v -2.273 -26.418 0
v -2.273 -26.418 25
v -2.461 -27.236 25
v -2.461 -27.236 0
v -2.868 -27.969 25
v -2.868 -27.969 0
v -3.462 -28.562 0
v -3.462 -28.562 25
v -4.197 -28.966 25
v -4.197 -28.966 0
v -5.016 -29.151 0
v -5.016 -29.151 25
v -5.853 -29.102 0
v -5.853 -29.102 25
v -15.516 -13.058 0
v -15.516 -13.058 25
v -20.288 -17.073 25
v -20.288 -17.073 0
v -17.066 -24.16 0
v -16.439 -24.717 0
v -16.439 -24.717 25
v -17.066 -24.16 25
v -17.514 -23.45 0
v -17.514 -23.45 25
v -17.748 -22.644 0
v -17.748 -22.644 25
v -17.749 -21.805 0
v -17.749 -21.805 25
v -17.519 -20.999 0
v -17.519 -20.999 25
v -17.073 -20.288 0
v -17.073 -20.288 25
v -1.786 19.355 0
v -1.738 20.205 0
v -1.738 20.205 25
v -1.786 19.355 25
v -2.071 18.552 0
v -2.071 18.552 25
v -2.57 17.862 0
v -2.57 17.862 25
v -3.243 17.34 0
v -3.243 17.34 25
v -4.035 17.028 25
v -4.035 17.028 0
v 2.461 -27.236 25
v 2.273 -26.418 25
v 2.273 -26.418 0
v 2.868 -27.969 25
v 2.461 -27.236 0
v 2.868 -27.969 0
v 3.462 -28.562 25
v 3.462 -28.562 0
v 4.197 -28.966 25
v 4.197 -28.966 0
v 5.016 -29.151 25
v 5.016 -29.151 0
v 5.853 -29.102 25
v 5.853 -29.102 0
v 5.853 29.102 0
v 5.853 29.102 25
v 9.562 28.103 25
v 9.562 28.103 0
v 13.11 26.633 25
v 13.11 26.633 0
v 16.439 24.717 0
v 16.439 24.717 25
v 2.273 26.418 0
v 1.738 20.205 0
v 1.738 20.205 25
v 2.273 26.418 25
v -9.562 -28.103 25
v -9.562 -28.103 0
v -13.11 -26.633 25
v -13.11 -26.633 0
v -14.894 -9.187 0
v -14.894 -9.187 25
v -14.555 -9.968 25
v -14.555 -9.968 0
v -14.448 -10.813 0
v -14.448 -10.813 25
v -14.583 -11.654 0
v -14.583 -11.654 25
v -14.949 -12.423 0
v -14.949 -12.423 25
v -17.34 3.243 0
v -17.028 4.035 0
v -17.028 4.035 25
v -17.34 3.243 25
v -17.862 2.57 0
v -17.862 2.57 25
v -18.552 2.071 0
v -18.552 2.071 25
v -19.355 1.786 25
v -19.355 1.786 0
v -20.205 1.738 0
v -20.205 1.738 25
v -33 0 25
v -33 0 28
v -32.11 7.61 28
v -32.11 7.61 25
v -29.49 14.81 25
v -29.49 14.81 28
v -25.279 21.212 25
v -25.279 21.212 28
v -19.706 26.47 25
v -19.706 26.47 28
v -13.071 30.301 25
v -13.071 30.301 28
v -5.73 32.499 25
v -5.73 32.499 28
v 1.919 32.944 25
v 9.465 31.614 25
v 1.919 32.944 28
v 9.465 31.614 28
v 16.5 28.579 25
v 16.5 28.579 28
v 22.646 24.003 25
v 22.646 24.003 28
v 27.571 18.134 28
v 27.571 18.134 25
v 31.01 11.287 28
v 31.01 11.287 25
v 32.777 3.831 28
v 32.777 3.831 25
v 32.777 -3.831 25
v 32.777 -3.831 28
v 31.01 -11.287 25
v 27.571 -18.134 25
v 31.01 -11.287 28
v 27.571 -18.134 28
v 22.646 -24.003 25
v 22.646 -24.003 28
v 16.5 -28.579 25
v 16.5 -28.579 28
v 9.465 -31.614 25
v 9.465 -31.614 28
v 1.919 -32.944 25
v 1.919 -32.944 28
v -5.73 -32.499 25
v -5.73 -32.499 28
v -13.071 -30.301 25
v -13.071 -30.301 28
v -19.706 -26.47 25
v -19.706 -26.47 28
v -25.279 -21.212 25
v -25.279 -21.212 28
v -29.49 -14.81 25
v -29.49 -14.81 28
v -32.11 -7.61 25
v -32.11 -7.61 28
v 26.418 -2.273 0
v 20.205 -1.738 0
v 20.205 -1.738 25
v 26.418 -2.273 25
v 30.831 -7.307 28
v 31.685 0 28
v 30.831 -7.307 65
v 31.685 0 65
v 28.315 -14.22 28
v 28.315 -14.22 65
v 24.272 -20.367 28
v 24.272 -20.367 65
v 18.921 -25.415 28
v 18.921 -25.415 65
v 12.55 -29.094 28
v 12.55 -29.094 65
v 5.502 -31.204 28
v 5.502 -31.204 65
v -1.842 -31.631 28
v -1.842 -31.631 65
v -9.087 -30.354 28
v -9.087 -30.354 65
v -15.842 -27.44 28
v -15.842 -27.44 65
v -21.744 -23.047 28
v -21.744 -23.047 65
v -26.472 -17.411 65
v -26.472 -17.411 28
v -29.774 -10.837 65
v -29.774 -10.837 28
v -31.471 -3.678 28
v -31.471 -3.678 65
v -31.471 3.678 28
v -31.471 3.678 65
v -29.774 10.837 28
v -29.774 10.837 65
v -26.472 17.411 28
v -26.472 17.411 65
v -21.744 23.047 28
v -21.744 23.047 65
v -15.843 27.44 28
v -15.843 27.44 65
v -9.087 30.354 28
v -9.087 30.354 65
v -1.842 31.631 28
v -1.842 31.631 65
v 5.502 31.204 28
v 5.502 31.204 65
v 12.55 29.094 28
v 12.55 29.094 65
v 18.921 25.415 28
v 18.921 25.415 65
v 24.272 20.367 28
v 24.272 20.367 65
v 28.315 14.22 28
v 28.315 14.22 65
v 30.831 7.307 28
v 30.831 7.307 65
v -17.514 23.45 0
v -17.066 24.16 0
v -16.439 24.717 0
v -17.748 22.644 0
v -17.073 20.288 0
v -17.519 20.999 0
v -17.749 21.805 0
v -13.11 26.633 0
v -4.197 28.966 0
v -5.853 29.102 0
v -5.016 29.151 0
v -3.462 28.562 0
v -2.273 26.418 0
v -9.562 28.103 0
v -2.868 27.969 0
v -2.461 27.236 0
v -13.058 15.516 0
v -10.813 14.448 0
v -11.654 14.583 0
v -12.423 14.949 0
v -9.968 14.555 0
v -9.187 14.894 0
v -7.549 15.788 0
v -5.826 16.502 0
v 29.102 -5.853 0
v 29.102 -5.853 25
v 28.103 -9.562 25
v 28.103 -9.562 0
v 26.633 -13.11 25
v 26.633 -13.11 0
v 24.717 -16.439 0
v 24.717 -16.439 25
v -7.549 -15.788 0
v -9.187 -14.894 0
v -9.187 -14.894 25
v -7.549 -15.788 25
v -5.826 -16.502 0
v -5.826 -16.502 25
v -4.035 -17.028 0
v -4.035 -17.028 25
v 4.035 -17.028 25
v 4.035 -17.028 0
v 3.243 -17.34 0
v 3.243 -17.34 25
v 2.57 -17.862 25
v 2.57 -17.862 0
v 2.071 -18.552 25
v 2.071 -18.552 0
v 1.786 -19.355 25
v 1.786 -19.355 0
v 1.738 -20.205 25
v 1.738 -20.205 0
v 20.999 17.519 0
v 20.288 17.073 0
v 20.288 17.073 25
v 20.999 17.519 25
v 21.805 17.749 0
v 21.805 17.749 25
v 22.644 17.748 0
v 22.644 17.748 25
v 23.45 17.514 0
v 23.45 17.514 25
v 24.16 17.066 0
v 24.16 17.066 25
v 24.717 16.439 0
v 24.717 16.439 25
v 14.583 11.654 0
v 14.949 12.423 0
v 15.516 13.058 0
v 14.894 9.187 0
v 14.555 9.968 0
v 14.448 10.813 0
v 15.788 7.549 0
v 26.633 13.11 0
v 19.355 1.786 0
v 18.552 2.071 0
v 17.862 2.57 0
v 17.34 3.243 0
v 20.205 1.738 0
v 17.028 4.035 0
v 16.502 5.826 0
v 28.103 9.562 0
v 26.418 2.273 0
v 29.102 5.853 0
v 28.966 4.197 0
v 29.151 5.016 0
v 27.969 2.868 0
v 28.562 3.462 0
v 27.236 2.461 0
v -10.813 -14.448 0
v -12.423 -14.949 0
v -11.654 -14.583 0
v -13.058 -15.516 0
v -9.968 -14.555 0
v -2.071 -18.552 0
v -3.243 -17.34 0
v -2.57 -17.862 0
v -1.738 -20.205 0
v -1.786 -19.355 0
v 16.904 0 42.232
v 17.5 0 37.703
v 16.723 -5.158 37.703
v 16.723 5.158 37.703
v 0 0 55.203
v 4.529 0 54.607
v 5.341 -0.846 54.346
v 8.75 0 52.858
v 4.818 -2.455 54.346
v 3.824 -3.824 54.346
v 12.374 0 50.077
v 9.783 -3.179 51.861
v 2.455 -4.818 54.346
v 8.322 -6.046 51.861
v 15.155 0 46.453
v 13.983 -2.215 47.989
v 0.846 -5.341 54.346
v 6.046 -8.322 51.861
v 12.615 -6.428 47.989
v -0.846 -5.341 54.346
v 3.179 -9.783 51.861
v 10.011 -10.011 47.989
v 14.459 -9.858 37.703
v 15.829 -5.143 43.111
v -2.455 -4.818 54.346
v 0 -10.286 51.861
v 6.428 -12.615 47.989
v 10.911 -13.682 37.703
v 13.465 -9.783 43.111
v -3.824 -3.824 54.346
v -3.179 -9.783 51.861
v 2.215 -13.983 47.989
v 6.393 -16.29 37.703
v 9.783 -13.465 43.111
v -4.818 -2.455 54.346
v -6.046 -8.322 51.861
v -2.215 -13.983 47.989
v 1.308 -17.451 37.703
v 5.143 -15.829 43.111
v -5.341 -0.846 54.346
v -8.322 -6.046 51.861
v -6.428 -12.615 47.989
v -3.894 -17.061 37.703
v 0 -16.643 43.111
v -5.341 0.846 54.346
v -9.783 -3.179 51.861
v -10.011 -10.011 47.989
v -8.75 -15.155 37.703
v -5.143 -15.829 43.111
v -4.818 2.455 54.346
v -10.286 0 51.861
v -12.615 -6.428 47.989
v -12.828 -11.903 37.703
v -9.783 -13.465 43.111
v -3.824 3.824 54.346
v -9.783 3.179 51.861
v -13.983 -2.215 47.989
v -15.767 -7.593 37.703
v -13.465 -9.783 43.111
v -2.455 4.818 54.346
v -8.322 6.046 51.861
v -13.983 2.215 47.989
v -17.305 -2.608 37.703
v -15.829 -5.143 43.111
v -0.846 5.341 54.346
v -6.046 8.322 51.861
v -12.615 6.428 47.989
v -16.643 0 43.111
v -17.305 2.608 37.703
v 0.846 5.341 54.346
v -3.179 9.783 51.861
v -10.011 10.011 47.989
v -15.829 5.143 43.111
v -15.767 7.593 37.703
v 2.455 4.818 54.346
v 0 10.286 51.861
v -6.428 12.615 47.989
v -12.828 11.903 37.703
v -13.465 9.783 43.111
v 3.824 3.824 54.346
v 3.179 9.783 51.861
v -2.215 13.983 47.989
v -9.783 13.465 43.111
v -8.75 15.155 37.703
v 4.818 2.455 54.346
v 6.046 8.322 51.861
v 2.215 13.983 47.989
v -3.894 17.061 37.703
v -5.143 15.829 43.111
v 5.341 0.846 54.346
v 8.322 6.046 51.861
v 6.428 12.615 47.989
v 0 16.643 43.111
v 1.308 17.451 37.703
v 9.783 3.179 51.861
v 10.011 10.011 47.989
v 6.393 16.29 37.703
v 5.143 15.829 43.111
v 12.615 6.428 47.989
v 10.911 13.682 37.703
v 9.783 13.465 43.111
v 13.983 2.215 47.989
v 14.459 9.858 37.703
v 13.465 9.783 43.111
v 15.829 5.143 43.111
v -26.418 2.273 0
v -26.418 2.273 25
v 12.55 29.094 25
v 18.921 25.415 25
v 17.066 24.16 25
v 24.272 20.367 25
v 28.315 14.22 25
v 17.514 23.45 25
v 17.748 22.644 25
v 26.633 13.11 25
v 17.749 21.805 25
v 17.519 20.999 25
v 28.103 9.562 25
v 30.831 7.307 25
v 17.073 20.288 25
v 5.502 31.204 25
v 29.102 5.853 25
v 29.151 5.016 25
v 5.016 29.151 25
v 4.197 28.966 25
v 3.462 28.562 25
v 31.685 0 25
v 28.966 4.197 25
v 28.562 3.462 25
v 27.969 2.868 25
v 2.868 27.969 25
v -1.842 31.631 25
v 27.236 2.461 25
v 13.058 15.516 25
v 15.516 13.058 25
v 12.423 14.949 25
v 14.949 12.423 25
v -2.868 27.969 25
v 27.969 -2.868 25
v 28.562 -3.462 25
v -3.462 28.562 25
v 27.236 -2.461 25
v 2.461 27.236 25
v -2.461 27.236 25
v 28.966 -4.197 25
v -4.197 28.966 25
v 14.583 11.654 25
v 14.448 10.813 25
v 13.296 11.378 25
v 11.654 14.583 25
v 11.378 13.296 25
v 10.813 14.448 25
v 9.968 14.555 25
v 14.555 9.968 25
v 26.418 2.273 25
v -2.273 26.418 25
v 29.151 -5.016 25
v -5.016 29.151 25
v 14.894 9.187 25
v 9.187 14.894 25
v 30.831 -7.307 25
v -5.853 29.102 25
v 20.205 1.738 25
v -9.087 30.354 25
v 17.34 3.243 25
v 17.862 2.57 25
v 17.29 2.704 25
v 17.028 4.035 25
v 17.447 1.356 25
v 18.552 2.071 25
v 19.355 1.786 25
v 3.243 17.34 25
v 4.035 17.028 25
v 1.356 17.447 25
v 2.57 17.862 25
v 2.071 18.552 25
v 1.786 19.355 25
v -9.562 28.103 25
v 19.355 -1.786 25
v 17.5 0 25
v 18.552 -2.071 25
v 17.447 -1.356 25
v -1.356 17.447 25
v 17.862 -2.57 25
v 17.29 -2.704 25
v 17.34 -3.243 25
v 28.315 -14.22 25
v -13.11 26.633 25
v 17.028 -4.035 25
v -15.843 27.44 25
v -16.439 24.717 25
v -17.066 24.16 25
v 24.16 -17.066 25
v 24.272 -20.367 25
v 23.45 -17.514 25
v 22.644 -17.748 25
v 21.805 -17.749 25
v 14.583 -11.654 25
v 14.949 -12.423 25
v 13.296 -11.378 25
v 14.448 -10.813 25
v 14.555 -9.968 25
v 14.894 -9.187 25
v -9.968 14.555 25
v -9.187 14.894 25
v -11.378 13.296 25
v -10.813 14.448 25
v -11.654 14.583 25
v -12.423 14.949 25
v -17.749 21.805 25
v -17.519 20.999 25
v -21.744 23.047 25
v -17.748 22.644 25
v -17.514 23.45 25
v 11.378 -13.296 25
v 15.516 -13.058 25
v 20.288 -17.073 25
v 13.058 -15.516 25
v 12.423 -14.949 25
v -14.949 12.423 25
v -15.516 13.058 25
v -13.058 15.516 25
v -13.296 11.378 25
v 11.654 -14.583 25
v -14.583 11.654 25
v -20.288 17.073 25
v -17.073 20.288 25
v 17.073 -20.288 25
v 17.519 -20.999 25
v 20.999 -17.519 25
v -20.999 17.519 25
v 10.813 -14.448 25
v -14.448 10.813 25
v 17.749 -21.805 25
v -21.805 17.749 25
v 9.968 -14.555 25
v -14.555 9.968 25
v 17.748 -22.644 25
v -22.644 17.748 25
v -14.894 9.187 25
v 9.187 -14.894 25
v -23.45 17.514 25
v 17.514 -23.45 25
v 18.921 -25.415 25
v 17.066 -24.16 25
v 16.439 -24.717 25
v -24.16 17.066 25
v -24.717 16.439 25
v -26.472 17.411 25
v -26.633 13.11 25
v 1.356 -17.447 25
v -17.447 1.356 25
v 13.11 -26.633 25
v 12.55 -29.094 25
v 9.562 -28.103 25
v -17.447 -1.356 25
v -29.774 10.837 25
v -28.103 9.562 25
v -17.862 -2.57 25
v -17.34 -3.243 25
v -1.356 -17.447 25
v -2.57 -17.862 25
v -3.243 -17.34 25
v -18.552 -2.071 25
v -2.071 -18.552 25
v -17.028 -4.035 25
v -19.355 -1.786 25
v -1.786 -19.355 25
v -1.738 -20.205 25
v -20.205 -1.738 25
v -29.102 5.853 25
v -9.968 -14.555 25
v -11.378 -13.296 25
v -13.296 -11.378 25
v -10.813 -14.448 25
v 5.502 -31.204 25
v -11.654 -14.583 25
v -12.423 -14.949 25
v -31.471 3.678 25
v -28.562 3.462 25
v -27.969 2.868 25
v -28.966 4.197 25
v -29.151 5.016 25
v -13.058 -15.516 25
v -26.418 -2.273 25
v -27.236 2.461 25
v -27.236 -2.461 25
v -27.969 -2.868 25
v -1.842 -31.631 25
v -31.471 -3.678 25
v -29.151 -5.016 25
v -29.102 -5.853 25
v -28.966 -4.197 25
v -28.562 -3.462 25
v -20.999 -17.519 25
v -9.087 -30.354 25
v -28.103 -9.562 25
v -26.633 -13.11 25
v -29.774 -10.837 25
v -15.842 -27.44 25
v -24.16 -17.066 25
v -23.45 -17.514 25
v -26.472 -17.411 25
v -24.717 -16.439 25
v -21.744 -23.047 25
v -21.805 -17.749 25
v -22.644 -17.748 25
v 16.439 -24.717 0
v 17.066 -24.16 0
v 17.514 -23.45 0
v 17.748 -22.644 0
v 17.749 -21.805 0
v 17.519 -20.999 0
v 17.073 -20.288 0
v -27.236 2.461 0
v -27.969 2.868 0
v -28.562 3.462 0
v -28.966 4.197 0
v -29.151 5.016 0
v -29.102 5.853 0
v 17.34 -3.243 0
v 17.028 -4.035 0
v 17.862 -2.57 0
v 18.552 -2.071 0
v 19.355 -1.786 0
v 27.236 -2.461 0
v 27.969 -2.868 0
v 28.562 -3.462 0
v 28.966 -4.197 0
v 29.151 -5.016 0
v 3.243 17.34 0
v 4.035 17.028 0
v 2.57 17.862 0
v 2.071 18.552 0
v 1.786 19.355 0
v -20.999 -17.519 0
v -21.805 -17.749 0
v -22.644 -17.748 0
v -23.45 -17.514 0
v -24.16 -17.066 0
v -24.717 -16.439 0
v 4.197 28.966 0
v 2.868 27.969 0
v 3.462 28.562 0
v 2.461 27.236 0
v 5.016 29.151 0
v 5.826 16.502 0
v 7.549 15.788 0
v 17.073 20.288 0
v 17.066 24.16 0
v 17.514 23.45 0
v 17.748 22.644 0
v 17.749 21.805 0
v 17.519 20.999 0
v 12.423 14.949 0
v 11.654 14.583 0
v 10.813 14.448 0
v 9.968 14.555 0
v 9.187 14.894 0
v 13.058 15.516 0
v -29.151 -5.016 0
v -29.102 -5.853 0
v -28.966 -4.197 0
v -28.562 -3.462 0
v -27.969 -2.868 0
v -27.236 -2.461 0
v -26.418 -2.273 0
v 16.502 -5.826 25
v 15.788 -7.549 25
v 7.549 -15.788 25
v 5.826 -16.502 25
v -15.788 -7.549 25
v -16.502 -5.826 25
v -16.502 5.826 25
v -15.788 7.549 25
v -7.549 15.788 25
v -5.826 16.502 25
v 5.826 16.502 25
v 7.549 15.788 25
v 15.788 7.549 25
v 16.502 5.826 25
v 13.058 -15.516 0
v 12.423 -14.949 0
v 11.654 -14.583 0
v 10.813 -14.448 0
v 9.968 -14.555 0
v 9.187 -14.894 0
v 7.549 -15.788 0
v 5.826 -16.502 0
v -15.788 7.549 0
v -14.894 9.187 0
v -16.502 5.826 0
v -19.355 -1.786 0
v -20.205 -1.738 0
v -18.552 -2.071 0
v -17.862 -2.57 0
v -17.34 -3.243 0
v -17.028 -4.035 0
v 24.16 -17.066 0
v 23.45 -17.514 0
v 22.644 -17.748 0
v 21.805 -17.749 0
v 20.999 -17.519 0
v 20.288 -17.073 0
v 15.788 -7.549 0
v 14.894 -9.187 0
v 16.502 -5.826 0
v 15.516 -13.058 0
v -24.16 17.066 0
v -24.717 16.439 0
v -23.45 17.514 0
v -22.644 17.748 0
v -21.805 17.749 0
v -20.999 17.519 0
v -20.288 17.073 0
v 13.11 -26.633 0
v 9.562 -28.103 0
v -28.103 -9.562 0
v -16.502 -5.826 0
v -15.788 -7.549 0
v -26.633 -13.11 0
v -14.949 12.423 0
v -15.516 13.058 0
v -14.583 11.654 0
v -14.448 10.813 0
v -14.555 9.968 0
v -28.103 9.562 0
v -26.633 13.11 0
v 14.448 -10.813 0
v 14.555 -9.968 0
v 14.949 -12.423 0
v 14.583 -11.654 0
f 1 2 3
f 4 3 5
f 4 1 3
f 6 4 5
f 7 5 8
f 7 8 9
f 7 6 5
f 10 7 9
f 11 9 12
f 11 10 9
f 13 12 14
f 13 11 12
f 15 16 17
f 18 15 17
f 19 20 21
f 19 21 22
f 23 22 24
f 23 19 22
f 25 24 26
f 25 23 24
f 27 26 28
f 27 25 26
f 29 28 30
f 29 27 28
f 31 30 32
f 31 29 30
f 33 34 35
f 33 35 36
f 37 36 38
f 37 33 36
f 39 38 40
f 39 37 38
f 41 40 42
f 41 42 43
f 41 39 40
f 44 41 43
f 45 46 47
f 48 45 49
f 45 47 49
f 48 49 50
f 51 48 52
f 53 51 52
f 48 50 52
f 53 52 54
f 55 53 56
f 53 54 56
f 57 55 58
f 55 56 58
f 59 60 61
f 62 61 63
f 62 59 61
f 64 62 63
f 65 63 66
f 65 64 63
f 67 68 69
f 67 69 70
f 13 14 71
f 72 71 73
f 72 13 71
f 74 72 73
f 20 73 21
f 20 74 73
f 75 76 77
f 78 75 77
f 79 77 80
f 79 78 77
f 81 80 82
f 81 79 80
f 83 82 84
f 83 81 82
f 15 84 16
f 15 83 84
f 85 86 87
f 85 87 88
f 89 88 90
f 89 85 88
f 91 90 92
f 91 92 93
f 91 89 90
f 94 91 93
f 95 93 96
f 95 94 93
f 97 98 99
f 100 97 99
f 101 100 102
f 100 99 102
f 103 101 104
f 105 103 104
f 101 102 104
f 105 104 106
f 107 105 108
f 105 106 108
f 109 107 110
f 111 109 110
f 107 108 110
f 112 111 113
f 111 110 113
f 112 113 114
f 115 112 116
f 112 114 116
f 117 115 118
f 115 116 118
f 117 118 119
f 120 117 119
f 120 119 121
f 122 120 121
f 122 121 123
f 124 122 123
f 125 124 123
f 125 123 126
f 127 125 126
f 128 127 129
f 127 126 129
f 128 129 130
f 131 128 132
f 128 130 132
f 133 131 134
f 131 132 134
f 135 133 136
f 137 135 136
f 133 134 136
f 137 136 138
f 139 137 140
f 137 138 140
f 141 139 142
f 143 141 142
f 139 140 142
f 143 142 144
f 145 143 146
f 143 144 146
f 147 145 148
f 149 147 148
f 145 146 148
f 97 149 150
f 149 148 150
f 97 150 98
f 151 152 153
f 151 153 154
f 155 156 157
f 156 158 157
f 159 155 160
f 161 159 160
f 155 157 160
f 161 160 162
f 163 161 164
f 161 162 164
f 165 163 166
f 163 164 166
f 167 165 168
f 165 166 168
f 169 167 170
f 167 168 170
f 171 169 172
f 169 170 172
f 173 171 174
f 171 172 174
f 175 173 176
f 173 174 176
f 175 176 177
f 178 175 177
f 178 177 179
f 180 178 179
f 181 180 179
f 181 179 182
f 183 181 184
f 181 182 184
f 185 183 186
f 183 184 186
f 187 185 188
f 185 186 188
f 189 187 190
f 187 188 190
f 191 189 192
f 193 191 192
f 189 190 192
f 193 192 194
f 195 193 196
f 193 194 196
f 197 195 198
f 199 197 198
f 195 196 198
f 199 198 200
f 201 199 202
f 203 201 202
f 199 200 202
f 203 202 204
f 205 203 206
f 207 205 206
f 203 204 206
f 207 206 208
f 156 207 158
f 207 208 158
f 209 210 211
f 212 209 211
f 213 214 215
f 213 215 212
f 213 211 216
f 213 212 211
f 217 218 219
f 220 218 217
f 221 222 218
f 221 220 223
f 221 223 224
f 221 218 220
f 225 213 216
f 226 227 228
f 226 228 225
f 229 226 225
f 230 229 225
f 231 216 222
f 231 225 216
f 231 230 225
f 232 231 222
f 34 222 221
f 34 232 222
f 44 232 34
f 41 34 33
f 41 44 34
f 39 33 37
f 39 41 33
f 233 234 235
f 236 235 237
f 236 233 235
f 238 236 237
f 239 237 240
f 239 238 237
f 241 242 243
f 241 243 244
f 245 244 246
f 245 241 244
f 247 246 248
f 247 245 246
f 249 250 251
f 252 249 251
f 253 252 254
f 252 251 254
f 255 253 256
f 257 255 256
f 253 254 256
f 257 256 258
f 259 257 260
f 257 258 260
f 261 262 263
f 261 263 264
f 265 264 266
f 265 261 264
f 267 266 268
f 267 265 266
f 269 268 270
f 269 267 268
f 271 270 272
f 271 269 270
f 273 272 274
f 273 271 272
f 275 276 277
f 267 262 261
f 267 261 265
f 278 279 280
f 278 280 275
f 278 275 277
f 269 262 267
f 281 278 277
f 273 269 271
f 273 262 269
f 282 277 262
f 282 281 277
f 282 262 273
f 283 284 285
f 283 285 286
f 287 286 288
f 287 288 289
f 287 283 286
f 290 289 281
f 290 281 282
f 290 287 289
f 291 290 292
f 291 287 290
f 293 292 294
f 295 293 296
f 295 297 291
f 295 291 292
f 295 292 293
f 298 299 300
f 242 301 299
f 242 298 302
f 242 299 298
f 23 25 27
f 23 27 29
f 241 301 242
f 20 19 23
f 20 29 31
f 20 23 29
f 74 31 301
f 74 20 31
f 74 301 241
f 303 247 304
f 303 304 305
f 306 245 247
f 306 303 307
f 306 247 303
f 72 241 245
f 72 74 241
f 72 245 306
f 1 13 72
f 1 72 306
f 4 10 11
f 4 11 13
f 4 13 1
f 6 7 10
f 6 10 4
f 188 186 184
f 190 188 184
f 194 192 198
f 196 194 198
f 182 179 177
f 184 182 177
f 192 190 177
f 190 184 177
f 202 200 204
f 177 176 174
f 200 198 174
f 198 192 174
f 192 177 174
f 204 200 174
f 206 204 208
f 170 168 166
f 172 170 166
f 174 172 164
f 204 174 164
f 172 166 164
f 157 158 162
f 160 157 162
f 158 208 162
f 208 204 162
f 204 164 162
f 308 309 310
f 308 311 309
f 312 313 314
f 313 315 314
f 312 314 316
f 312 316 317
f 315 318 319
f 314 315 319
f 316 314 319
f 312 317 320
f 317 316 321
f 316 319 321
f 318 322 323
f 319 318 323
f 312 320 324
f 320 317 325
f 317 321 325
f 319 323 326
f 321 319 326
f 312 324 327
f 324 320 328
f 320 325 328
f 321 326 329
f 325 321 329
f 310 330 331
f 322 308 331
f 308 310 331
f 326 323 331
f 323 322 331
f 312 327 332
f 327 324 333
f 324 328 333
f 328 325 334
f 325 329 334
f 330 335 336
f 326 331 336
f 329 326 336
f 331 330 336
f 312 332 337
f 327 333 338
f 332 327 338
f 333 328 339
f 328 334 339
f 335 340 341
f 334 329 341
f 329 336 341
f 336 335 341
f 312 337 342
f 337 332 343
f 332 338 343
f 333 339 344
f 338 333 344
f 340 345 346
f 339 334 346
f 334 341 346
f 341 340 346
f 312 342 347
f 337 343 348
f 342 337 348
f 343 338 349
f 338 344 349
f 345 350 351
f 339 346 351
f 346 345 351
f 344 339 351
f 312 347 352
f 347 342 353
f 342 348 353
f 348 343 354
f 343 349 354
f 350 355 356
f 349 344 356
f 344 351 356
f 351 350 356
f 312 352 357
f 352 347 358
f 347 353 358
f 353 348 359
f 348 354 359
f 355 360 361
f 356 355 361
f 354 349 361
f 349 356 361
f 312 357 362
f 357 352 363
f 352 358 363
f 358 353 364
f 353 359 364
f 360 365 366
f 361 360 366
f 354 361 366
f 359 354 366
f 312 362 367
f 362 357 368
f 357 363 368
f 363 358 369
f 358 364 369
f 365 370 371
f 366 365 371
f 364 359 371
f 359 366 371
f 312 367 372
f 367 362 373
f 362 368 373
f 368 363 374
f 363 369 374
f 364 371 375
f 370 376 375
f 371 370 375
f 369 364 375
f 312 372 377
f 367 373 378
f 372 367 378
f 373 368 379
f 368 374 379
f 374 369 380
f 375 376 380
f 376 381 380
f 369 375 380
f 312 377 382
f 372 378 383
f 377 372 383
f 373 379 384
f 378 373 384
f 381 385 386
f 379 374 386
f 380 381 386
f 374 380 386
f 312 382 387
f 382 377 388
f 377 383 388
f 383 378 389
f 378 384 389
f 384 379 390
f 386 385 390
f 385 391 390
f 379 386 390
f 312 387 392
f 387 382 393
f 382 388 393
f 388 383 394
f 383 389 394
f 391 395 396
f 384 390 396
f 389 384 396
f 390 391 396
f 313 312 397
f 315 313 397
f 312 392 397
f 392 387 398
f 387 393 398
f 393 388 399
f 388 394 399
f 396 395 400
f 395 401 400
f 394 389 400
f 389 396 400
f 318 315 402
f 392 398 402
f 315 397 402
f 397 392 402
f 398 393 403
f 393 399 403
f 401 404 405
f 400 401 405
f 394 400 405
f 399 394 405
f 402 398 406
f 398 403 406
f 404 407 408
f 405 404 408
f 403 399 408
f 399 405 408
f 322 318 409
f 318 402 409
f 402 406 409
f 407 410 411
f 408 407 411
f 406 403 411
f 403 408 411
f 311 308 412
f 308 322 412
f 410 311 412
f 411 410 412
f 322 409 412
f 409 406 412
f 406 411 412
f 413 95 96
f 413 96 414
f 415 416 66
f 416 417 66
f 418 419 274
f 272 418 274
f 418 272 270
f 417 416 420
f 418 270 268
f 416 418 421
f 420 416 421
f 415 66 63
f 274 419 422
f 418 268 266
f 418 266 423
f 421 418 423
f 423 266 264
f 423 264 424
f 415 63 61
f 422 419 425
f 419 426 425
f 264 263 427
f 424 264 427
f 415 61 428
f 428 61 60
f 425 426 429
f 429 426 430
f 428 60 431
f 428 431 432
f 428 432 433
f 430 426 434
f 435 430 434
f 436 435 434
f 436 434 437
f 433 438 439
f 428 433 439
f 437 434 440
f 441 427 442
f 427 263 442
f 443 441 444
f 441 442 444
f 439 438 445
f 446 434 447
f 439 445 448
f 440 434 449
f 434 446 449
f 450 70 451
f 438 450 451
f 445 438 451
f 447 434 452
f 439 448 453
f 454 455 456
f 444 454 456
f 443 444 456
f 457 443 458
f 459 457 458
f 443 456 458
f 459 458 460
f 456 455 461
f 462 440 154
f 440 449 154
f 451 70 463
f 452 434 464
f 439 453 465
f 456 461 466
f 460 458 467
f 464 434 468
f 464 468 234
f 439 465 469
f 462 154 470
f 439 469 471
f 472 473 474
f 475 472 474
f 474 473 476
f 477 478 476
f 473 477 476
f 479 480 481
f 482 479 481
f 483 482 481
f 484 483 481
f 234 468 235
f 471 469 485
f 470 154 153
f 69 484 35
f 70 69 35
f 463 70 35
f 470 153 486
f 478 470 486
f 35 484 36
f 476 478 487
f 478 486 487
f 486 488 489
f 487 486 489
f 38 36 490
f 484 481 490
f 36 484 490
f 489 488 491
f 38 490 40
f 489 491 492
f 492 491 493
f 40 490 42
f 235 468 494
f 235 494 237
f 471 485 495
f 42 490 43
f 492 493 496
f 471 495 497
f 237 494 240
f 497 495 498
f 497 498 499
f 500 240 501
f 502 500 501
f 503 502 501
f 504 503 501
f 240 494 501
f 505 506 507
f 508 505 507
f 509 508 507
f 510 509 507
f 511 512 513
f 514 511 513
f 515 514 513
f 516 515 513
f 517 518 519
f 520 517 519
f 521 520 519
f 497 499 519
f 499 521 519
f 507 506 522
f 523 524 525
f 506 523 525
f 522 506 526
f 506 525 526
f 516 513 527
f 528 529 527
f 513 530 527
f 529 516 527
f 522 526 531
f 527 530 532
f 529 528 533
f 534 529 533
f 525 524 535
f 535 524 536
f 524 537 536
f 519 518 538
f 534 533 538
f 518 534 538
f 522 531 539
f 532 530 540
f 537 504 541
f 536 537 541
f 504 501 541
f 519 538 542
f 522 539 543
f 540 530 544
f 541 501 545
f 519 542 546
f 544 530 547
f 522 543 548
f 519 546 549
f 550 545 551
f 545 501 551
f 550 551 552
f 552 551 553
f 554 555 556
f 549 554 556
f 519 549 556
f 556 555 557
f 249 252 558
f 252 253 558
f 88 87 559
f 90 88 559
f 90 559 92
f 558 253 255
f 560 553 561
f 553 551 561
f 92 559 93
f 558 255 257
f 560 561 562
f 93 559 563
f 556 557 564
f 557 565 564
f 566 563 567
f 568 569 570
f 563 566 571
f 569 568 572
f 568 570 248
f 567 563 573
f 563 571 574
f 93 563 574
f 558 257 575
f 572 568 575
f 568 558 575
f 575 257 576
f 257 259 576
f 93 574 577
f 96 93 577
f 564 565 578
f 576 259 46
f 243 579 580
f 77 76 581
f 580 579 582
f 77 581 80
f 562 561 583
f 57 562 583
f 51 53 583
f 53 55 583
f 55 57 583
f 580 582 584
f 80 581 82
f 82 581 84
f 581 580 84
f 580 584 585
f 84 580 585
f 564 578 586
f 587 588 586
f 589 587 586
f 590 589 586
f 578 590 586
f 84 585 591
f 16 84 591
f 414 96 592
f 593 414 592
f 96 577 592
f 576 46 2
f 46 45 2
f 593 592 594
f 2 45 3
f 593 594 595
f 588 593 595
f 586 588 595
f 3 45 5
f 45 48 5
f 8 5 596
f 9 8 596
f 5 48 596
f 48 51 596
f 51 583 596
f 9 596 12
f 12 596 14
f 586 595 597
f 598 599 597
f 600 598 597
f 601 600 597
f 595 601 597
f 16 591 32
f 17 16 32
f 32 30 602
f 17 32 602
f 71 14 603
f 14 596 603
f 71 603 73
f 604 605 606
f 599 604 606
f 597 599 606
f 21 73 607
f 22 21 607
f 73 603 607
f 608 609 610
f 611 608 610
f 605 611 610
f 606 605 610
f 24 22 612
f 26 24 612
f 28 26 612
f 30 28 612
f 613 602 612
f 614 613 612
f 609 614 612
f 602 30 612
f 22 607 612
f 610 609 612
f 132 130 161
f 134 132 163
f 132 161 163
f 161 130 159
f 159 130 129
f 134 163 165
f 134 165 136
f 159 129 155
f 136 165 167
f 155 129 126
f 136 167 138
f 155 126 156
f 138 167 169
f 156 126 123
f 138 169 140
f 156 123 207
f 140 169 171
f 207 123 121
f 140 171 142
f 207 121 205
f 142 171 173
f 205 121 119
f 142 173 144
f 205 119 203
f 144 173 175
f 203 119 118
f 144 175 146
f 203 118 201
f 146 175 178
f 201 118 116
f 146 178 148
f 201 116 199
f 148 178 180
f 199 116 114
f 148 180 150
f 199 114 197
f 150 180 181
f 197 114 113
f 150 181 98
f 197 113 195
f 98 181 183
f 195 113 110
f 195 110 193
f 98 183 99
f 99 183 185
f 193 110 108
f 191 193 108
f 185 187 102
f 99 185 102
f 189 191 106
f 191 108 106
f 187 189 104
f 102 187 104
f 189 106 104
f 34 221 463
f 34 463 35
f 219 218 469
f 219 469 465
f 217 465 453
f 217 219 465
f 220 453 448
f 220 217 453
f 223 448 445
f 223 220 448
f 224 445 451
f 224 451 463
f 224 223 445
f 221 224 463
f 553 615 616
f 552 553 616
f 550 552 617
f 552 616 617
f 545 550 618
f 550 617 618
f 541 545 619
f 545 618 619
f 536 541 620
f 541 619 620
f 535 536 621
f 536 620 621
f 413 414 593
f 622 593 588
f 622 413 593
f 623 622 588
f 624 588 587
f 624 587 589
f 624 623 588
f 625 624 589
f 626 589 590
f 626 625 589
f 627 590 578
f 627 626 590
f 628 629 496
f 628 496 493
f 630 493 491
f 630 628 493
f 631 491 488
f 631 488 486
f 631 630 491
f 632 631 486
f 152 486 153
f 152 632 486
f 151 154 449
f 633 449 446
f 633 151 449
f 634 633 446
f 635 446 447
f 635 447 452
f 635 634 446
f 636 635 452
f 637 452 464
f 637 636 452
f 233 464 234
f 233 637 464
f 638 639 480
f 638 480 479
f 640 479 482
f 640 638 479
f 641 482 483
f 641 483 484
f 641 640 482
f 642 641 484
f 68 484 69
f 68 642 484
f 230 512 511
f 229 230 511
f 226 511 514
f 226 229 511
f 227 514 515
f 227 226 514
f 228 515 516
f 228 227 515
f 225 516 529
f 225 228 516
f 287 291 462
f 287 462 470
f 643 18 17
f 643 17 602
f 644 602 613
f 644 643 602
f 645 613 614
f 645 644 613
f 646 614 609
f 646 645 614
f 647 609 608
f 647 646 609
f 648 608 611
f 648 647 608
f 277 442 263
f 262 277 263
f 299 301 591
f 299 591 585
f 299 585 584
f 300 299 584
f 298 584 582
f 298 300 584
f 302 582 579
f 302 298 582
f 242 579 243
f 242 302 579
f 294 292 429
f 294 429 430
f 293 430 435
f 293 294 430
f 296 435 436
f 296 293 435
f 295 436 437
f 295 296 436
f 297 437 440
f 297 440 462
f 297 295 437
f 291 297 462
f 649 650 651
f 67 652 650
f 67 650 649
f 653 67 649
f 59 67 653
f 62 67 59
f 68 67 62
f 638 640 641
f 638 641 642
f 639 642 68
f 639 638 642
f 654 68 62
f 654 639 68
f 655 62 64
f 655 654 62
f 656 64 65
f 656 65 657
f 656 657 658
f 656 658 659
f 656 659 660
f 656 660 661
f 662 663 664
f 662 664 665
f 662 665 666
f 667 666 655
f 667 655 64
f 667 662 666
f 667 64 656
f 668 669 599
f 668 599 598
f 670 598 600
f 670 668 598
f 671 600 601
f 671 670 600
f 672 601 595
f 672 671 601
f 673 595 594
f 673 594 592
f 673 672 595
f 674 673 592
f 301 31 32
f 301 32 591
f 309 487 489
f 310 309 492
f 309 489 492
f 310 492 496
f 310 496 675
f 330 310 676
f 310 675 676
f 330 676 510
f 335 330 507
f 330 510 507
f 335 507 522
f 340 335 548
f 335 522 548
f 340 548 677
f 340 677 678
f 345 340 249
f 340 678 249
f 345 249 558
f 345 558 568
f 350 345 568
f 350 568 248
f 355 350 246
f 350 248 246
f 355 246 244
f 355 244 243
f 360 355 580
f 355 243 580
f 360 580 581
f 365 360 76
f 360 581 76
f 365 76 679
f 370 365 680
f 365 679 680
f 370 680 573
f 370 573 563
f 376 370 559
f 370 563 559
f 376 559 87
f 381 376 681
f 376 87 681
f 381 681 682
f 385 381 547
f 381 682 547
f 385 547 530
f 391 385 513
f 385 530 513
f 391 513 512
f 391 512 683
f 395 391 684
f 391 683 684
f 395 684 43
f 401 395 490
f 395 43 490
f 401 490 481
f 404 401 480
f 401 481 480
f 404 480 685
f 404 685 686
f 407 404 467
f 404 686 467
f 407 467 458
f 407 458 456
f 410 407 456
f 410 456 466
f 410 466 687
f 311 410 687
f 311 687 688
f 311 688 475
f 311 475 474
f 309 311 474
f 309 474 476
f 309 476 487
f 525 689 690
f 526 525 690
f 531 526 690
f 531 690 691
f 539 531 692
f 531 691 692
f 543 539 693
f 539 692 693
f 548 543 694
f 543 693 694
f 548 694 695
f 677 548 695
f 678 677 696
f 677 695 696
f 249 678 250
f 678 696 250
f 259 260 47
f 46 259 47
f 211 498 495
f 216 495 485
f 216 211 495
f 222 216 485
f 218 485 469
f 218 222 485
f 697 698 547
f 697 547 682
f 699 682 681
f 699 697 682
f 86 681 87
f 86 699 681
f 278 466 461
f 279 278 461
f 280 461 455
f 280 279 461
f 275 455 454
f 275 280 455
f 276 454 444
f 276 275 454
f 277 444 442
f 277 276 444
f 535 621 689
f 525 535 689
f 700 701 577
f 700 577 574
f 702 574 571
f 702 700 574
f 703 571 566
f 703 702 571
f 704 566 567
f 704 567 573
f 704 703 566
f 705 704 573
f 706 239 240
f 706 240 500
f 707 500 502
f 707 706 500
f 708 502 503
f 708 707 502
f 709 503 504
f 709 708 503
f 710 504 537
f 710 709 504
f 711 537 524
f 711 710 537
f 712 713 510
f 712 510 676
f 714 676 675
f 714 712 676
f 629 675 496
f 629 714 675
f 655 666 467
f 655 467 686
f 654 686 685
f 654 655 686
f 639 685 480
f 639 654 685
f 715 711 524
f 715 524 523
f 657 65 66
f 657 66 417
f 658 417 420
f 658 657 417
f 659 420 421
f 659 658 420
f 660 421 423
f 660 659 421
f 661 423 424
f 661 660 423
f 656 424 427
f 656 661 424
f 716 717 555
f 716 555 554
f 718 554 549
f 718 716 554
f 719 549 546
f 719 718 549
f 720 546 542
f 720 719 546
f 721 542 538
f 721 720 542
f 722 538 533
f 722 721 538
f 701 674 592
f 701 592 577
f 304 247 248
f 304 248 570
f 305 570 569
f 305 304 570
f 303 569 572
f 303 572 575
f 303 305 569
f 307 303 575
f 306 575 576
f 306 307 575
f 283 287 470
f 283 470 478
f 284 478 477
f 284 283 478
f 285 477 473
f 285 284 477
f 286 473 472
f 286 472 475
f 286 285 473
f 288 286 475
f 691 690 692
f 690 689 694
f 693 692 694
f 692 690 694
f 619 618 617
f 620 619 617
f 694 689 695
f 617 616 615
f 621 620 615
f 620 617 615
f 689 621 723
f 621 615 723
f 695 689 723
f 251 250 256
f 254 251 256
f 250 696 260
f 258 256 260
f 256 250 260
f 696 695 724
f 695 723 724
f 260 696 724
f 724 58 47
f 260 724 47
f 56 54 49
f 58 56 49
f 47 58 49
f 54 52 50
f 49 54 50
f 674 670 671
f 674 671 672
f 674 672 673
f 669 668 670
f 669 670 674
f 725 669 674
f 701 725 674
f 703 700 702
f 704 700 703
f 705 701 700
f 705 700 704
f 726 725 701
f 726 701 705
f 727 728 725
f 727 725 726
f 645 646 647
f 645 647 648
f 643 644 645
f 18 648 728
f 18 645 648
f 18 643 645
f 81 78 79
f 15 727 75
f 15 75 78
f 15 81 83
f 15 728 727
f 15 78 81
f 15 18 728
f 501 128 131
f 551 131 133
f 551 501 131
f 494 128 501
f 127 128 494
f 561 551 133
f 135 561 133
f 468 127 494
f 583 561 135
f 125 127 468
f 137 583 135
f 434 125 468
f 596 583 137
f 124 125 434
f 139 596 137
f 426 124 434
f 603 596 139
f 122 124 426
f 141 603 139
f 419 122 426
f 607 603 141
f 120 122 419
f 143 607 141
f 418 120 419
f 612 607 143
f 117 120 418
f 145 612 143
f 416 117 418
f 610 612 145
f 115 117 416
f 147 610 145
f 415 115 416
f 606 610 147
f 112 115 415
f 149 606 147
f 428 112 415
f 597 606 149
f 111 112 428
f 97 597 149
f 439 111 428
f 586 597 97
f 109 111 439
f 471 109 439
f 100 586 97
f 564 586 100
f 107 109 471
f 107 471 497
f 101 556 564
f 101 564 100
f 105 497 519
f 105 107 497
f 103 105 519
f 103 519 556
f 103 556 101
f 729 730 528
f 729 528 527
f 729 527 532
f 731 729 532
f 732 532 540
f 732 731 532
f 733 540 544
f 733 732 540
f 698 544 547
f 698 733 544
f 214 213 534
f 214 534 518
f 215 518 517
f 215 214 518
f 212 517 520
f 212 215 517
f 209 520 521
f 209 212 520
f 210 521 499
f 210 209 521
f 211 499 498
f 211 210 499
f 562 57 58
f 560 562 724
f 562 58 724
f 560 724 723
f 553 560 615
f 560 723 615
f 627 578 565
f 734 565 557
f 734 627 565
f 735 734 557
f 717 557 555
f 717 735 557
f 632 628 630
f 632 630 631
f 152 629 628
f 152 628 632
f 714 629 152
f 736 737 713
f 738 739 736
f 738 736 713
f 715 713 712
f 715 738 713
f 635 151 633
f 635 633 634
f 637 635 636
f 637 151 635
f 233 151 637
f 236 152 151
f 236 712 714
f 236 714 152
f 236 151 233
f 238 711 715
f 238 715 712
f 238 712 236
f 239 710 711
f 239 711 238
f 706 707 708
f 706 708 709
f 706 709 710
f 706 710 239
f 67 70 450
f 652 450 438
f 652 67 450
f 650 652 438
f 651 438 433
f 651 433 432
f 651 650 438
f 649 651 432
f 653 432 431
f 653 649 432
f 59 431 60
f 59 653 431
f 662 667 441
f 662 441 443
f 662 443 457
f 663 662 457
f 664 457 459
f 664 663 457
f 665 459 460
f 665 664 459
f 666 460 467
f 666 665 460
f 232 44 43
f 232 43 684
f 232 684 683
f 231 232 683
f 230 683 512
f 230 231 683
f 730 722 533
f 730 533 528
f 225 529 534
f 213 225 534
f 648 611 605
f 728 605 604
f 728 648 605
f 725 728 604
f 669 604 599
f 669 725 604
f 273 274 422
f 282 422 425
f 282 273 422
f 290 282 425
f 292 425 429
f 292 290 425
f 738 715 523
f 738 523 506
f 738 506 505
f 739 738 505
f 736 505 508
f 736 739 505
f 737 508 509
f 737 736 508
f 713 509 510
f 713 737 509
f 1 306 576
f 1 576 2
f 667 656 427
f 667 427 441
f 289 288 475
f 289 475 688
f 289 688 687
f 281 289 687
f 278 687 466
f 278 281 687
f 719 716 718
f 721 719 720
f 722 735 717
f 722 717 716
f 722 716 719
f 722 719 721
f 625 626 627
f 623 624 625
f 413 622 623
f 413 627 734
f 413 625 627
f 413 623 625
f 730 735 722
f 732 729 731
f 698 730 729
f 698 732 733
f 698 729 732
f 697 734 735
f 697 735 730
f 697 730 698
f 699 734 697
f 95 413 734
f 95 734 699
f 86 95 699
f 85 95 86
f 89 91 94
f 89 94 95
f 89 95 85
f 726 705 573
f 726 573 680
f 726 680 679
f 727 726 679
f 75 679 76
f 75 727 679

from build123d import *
from build123d.topology import SkipClean

# Parameters (mm, degrees)
BOSS_EXTRUDE1_DEPTH   = 25
BOSS_EXTRUDE1_2_DEPTH = 25
BOSS_EXTRUDE1_3_DEPTH = 25
BOSS_EXTRUDE1_4_DEPTH = 25
BOSS_EXTRUDE1_5_DEPTH = 25
BOSS_EXTRUDE1_6_DEPTH = 25
BOSS_EXTRUDE1_7_DEPTH = 25
BOSS_EXTRUDE1_8_DEPTH = 25
BOSS_EXTRUDE2_START   = -3
SKETCH6_R             = 33
SKETCH6_R_2           = 31.685
BOSS_EXTRUDE2_DEPTH   = 3


with BuildPart() as part:
    # Sketch1 → Boss-Extrude1 (new body)
    with BuildSketch(Plane(origin=(0, 0, 0), x_dir=(-1, 0, 0), z_dir=(0, 0, 1))):
        with BuildLine():
            Line((-1.738225696, 20.20466707), (-2.272785403, 26.41824505))
            ThreePointArc((-2.272785403, 26.41824505), (-3.462351882, 28.561557475), (-5.853284272, 29.102204182))
            ThreePointArc((-5.853284272, 29.102204182), (-11.35995769, 27.425363923), (-16.439468924, 24.717262925))
            ThreePointArc((-16.439468924, 24.717262925), (-17.747818477, 22.644323466), (-17.073418251, 20.287622193))
            Line((-17.073418251, 20.287622193), (-13.05774592, 15.515968274))
            ThreePointArc((-13.05774592, 15.515968274), (-11.238150281, 14.485616628), (-9.187418979, 14.894338942))
            ThreePointArc((-9.187418979, 14.894338942), (-6.696960066, 16.167891819), (-4.035401805, 17.028374328))
            ThreePointArc((-4.035401805, 17.028374328), (-2.296305475, 18.189450019), (-1.738225696, 20.20466707))
        make_face()
    extrude(amount=BOSS_EXTRUDE1_DEPTH)



with BuildPart() as body_2:
    # Sketch1 → Boss-Extrude1 2 (new body)
    with BuildSketch(Plane(origin=(0, 0, 0), x_dir=(-1, 0, 0), z_dir=(0, 0, 1))):
        with BuildLine():
            Line((1.738225696, 20.20466707), (2.272785403, 26.41824505))
            ThreePointArc((2.272785403, 26.41824505), (3.462351882, 28.561557475), (5.853284272, 29.102204182))
            ThreePointArc((5.853284272, 29.102204182), (11.35995769, 27.425363923), (16.439468924, 24.717262925))
            ThreePointArc((16.439468924, 24.717262925), (17.747818477, 22.644323466), (17.073418251, 20.287622193))
            Line((17.073418251, 20.287622193), (13.05774592, 15.515968274))
            ThreePointArc((13.05774592, 15.515968274), (11.238150281, 14.485616628), (9.187418979, 14.894338942))
            ThreePointArc((9.187418979, 14.894338942), (6.696960066, 16.167891819), (4.035401805, 17.028374328))
            ThreePointArc((4.035401805, 17.028374328), (2.296305475, 18.189450019), (1.738225696, 20.20466707))
        make_face()
    extrude(amount=BOSS_EXTRUDE1_2_DEPTH)


with BuildPart() as body_3:
    # Sketch1 → Boss-Extrude1 3 (new body)
    with BuildSketch(Plane(origin=(0, 0, 0), x_dir=(-1, 0, 0), z_dir=(0, 0, 1))):
        with BuildLine():
            Line((15.515968274, 13.05774592), (20.287622193, 17.073418251))
            ThreePointArc((20.287622193, 17.073418251), (22.644323466, 17.747818477), (24.717262925, 16.439468924))
            ThreePointArc((24.717262925, 16.439468924), (27.425363923, 11.35995769), (29.102204182, 5.853284272))
            ThreePointArc((29.102204182, 5.853284272), (28.561557475, 3.462351882), (26.41824505, 2.272785403))
            Line((26.41824505, 2.272785403), (20.20466707, 1.738225696))
            ThreePointArc((20.20466707, 1.738225696), (18.189450019, 2.296305475), (17.028374328, 4.035401805))
            ThreePointArc((17.028374328, 4.035401805), (16.167891819, 6.696960066), (14.894338942, 9.187418979))
            ThreePointArc((14.894338942, 9.187418979), (14.485616628, 11.238150281), (15.515968274, 13.05774592))
        make_face()
    extrude(amount=BOSS_EXTRUDE1_3_DEPTH)


with BuildPart() as body_4:
    # Sketch1 → Boss-Extrude1 4 (new body)
    with BuildSketch(Plane(origin=(0, 0, 0), x_dir=(-1, 0, 0), z_dir=(0, 0, 1))):
        with BuildLine():
            Line((20.20466707, -1.738225696), (26.41824505, -2.272785403))
            ThreePointArc((26.41824505, -2.272785403), (28.561557475, -3.462351882), (29.102204182, -5.853284272))
            ThreePointArc((29.102204182, -5.853284272), (27.425363923, -11.35995769), (24.717262925, -16.439468924))
            ThreePointArc((24.717262925, -16.439468924), (22.644323466, -17.747818477), (20.287622193, -17.073418251))
            Line((20.287622193, -17.073418251), (15.515968274, -13.05774592))
            ThreePointArc((15.515968274, -13.05774592), (14.485616628, -11.238150281), (14.894338942, -9.187418979))
            ThreePointArc((14.894338942, -9.187418979), (16.167891819, -6.696960066), (17.028374328, -4.035401805))
            ThreePointArc((17.028374328, -4.035401805), (18.189450019, -2.296305475), (20.20466707, -1.738225696))
        make_face()
    extrude(amount=BOSS_EXTRUDE1_4_DEPTH)


with BuildPart() as body_5:
    # Sketch1 → Boss-Extrude1 5 (new body)
    with BuildSketch(Plane(origin=(0, 0, 0), x_dir=(-1, 0, 0), z_dir=(0, 0, 1))):
        with BuildLine():
            Line((13.05774592, -15.515968274), (17.073418251, -20.287622193))
            ThreePointArc((17.073418251, -20.287622193), (17.747818477, -22.644323466), (16.439468924, -24.717262925))
            ThreePointArc((16.439468924, -24.717262925), (11.35995769, -27.425363923), (5.853284272, -29.102204182))
            ThreePointArc((5.853284272, -29.102204182), (3.462351882, -28.561557475), (2.272785403, -26.41824505))
            Line((2.272785403, -26.41824505), (1.738225696, -20.20466707))
            ThreePointArc((1.738225696, -20.20466707), (2.296305475, -18.189450019), (4.035401805, -17.028374328))
            ThreePointArc((4.035401805, -17.028374328), (6.696960066, -16.167891819), (9.187418979, -14.894338942))
            ThreePointArc((9.187418979, -14.894338942), (11.238150281, -14.485616628), (13.05774592, -15.515968274))
        make_face()
    extrude(amount=BOSS_EXTRUDE1_5_DEPTH)


with BuildPart() as body_6:
    # Sketch1 → Boss-Extrude1 6 (new body)
    with BuildSketch(Plane(origin=(0, 0, 0), x_dir=(-1, 0, 0), z_dir=(0, 0, 1))):
        with BuildLine():
            Line((-1.738225696, -20.20466707), (-2.272785403, -26.41824505))
            ThreePointArc((-2.272785403, -26.41824505), (-3.462351882, -28.561557475), (-5.853284272, -29.102204182))
            ThreePointArc((-5.853284272, -29.102204182), (-11.35995769, -27.425363923), (-16.439468924, -24.717262925))
            ThreePointArc((-16.439468924, -24.717262925), (-17.747818477, -22.644323466), (-17.073418251, -20.287622193))
            Line((-17.073418251, -20.287622193), (-13.05774592, -15.515968274))
            ThreePointArc((-13.05774592, -15.515968274), (-11.238150281, -14.485616628), (-9.187418979, -14.894338942))
            ThreePointArc((-9.187418979, -14.894338942), (-6.696960066, -16.167891819), (-4.035401805, -17.028374328))
            ThreePointArc((-4.035401805, -17.028374328), (-2.296305475, -18.189450019), (-1.738225696, -20.20466707))
        make_face()
    extrude(amount=BOSS_EXTRUDE1_6_DEPTH)


with BuildPart() as body_7:
    # Sketch1 → Boss-Extrude1 7 (new body)
    with BuildSketch(Plane(origin=(0, 0, 0), x_dir=(-1, 0, 0), z_dir=(0, 0, 1))):
        with BuildLine():
            Line((-15.515968274, -13.05774592), (-20.287622193, -17.073418251))
            ThreePointArc((-20.287622193, -17.073418251), (-22.644323466, -17.747818477), (-24.717262925, -16.439468924))
            ThreePointArc((-24.717262925, -16.439468924), (-27.425363923, -11.35995769), (-29.102204182, -5.853284272))
            ThreePointArc((-29.102204182, -5.853284272), (-28.561557475, -3.462351882), (-26.41824505, -2.272785403))
            Line((-26.41824505, -2.272785403), (-20.20466707, -1.738225696))
            ThreePointArc((-20.20466707, -1.738225696), (-18.189450019, -2.296305475), (-17.028374328, -4.035401805))
            ThreePointArc((-17.028374328, -4.035401805), (-16.167891819, -6.696960066), (-14.894338942, -9.187418979))
            ThreePointArc((-14.894338942, -9.187418979), (-14.485616628, -11.238150281), (-15.515968274, -13.05774592))
        make_face()
    extrude(amount=BOSS_EXTRUDE1_7_DEPTH)


with BuildPart() as body_8:
    # Sketch1 → Boss-Extrude1 8 (new body)
    with BuildSketch(Plane(origin=(0, 0, 0), x_dir=(-1, 0, 0), z_dir=(0, 0, 1))):
        with BuildLine():
            Line((-20.20466707, 1.738225696), (-26.41824505, 2.272785403))
            ThreePointArc((-26.41824505, 2.272785403), (-28.561557475, 3.462351882), (-29.102204182, 5.853284272))
            ThreePointArc((-29.102204182, 5.853284272), (-27.425363923, 11.35995769), (-24.717262925, 16.439468924))
            ThreePointArc((-24.717262925, 16.439468924), (-22.644323466, 17.747818477), (-20.287622193, 17.073418251))
            Line((-20.287622193, 17.073418251), (-15.515968274, 13.05774592))
            ThreePointArc((-15.515968274, 13.05774592), (-14.485616628, 11.238150281), (-14.894338942, 9.187418979))
            ThreePointArc((-14.894338942, 9.187418979), (-16.167891819, 6.696960066), (-17.028374328, 4.035401805))
            ThreePointArc((-17.028374328, 4.035401805), (-18.189450019, 2.296305475), (-20.20466707, 1.738225696))
        make_face()
    extrude(amount=BOSS_EXTRUDE1_8_DEPTH)


with BuildPart() as part_1:
    with SkipClean():  # the faces are left unmerged after this step: merging them gives an invalid solid
        add(part.part)

        add(body_2.part)  # Revolve1 merges body 2

        add(body_3.part)  # Revolve1 merges body 3

        add(body_4.part)  # Revolve1 merges body 4

        add(body_5.part)  # Revolve1 merges body 5

        add(body_6.part)  # Revolve1 merges body 6

        add(body_7.part)  # Revolve1 merges body 7

        add(body_8.part)  # Revolve1 merges body 8
        # Sketch5 → Revolve1 (revolve)
        with BuildSketch(Plane(origin=(0, 0, 0), x_dir=(1, 0, 0), z_dir=(0, 1, 0))):
            with BuildLine():
                Line((17.5, -25), (31.685, -25))
                Line((31.685, -25), (31.685, -65))
                Line((31.685, -65), (0, -65))
                Line((0, -65), (0, -55.202941459))
                ThreePointArc((0, -55.202941459), (12.374368671, -50.07731013), (17.5, -37.702941459))
                Line((17.5, -37.702941459), (17.5, -25))
            make_face()
        revolve(axis=Axis((0, 0, 65), (0, 0, -1)))

    # Sketch6 → Boss-Extrude2 (add)
    with SkipClean():  # the faces are left unmerged after this step: merging them gives an invalid solid
        with BuildSketch(Plane(origin=(0, 0, 25), x_dir=(-1, 0, 0), z_dir=(0, 0, -1)).offset(BOSS_EXTRUDE2_START)):
            Circle(SKETCH6_R)
            with Locations(Location((0, 0, 0), (0, 0, 180))):
                Circle(SKETCH6_R_2, mode=Mode.SUBTRACT)
        extrude(amount=BOSS_EXTRUDE2_DEPTH)


solid = part_1.part
